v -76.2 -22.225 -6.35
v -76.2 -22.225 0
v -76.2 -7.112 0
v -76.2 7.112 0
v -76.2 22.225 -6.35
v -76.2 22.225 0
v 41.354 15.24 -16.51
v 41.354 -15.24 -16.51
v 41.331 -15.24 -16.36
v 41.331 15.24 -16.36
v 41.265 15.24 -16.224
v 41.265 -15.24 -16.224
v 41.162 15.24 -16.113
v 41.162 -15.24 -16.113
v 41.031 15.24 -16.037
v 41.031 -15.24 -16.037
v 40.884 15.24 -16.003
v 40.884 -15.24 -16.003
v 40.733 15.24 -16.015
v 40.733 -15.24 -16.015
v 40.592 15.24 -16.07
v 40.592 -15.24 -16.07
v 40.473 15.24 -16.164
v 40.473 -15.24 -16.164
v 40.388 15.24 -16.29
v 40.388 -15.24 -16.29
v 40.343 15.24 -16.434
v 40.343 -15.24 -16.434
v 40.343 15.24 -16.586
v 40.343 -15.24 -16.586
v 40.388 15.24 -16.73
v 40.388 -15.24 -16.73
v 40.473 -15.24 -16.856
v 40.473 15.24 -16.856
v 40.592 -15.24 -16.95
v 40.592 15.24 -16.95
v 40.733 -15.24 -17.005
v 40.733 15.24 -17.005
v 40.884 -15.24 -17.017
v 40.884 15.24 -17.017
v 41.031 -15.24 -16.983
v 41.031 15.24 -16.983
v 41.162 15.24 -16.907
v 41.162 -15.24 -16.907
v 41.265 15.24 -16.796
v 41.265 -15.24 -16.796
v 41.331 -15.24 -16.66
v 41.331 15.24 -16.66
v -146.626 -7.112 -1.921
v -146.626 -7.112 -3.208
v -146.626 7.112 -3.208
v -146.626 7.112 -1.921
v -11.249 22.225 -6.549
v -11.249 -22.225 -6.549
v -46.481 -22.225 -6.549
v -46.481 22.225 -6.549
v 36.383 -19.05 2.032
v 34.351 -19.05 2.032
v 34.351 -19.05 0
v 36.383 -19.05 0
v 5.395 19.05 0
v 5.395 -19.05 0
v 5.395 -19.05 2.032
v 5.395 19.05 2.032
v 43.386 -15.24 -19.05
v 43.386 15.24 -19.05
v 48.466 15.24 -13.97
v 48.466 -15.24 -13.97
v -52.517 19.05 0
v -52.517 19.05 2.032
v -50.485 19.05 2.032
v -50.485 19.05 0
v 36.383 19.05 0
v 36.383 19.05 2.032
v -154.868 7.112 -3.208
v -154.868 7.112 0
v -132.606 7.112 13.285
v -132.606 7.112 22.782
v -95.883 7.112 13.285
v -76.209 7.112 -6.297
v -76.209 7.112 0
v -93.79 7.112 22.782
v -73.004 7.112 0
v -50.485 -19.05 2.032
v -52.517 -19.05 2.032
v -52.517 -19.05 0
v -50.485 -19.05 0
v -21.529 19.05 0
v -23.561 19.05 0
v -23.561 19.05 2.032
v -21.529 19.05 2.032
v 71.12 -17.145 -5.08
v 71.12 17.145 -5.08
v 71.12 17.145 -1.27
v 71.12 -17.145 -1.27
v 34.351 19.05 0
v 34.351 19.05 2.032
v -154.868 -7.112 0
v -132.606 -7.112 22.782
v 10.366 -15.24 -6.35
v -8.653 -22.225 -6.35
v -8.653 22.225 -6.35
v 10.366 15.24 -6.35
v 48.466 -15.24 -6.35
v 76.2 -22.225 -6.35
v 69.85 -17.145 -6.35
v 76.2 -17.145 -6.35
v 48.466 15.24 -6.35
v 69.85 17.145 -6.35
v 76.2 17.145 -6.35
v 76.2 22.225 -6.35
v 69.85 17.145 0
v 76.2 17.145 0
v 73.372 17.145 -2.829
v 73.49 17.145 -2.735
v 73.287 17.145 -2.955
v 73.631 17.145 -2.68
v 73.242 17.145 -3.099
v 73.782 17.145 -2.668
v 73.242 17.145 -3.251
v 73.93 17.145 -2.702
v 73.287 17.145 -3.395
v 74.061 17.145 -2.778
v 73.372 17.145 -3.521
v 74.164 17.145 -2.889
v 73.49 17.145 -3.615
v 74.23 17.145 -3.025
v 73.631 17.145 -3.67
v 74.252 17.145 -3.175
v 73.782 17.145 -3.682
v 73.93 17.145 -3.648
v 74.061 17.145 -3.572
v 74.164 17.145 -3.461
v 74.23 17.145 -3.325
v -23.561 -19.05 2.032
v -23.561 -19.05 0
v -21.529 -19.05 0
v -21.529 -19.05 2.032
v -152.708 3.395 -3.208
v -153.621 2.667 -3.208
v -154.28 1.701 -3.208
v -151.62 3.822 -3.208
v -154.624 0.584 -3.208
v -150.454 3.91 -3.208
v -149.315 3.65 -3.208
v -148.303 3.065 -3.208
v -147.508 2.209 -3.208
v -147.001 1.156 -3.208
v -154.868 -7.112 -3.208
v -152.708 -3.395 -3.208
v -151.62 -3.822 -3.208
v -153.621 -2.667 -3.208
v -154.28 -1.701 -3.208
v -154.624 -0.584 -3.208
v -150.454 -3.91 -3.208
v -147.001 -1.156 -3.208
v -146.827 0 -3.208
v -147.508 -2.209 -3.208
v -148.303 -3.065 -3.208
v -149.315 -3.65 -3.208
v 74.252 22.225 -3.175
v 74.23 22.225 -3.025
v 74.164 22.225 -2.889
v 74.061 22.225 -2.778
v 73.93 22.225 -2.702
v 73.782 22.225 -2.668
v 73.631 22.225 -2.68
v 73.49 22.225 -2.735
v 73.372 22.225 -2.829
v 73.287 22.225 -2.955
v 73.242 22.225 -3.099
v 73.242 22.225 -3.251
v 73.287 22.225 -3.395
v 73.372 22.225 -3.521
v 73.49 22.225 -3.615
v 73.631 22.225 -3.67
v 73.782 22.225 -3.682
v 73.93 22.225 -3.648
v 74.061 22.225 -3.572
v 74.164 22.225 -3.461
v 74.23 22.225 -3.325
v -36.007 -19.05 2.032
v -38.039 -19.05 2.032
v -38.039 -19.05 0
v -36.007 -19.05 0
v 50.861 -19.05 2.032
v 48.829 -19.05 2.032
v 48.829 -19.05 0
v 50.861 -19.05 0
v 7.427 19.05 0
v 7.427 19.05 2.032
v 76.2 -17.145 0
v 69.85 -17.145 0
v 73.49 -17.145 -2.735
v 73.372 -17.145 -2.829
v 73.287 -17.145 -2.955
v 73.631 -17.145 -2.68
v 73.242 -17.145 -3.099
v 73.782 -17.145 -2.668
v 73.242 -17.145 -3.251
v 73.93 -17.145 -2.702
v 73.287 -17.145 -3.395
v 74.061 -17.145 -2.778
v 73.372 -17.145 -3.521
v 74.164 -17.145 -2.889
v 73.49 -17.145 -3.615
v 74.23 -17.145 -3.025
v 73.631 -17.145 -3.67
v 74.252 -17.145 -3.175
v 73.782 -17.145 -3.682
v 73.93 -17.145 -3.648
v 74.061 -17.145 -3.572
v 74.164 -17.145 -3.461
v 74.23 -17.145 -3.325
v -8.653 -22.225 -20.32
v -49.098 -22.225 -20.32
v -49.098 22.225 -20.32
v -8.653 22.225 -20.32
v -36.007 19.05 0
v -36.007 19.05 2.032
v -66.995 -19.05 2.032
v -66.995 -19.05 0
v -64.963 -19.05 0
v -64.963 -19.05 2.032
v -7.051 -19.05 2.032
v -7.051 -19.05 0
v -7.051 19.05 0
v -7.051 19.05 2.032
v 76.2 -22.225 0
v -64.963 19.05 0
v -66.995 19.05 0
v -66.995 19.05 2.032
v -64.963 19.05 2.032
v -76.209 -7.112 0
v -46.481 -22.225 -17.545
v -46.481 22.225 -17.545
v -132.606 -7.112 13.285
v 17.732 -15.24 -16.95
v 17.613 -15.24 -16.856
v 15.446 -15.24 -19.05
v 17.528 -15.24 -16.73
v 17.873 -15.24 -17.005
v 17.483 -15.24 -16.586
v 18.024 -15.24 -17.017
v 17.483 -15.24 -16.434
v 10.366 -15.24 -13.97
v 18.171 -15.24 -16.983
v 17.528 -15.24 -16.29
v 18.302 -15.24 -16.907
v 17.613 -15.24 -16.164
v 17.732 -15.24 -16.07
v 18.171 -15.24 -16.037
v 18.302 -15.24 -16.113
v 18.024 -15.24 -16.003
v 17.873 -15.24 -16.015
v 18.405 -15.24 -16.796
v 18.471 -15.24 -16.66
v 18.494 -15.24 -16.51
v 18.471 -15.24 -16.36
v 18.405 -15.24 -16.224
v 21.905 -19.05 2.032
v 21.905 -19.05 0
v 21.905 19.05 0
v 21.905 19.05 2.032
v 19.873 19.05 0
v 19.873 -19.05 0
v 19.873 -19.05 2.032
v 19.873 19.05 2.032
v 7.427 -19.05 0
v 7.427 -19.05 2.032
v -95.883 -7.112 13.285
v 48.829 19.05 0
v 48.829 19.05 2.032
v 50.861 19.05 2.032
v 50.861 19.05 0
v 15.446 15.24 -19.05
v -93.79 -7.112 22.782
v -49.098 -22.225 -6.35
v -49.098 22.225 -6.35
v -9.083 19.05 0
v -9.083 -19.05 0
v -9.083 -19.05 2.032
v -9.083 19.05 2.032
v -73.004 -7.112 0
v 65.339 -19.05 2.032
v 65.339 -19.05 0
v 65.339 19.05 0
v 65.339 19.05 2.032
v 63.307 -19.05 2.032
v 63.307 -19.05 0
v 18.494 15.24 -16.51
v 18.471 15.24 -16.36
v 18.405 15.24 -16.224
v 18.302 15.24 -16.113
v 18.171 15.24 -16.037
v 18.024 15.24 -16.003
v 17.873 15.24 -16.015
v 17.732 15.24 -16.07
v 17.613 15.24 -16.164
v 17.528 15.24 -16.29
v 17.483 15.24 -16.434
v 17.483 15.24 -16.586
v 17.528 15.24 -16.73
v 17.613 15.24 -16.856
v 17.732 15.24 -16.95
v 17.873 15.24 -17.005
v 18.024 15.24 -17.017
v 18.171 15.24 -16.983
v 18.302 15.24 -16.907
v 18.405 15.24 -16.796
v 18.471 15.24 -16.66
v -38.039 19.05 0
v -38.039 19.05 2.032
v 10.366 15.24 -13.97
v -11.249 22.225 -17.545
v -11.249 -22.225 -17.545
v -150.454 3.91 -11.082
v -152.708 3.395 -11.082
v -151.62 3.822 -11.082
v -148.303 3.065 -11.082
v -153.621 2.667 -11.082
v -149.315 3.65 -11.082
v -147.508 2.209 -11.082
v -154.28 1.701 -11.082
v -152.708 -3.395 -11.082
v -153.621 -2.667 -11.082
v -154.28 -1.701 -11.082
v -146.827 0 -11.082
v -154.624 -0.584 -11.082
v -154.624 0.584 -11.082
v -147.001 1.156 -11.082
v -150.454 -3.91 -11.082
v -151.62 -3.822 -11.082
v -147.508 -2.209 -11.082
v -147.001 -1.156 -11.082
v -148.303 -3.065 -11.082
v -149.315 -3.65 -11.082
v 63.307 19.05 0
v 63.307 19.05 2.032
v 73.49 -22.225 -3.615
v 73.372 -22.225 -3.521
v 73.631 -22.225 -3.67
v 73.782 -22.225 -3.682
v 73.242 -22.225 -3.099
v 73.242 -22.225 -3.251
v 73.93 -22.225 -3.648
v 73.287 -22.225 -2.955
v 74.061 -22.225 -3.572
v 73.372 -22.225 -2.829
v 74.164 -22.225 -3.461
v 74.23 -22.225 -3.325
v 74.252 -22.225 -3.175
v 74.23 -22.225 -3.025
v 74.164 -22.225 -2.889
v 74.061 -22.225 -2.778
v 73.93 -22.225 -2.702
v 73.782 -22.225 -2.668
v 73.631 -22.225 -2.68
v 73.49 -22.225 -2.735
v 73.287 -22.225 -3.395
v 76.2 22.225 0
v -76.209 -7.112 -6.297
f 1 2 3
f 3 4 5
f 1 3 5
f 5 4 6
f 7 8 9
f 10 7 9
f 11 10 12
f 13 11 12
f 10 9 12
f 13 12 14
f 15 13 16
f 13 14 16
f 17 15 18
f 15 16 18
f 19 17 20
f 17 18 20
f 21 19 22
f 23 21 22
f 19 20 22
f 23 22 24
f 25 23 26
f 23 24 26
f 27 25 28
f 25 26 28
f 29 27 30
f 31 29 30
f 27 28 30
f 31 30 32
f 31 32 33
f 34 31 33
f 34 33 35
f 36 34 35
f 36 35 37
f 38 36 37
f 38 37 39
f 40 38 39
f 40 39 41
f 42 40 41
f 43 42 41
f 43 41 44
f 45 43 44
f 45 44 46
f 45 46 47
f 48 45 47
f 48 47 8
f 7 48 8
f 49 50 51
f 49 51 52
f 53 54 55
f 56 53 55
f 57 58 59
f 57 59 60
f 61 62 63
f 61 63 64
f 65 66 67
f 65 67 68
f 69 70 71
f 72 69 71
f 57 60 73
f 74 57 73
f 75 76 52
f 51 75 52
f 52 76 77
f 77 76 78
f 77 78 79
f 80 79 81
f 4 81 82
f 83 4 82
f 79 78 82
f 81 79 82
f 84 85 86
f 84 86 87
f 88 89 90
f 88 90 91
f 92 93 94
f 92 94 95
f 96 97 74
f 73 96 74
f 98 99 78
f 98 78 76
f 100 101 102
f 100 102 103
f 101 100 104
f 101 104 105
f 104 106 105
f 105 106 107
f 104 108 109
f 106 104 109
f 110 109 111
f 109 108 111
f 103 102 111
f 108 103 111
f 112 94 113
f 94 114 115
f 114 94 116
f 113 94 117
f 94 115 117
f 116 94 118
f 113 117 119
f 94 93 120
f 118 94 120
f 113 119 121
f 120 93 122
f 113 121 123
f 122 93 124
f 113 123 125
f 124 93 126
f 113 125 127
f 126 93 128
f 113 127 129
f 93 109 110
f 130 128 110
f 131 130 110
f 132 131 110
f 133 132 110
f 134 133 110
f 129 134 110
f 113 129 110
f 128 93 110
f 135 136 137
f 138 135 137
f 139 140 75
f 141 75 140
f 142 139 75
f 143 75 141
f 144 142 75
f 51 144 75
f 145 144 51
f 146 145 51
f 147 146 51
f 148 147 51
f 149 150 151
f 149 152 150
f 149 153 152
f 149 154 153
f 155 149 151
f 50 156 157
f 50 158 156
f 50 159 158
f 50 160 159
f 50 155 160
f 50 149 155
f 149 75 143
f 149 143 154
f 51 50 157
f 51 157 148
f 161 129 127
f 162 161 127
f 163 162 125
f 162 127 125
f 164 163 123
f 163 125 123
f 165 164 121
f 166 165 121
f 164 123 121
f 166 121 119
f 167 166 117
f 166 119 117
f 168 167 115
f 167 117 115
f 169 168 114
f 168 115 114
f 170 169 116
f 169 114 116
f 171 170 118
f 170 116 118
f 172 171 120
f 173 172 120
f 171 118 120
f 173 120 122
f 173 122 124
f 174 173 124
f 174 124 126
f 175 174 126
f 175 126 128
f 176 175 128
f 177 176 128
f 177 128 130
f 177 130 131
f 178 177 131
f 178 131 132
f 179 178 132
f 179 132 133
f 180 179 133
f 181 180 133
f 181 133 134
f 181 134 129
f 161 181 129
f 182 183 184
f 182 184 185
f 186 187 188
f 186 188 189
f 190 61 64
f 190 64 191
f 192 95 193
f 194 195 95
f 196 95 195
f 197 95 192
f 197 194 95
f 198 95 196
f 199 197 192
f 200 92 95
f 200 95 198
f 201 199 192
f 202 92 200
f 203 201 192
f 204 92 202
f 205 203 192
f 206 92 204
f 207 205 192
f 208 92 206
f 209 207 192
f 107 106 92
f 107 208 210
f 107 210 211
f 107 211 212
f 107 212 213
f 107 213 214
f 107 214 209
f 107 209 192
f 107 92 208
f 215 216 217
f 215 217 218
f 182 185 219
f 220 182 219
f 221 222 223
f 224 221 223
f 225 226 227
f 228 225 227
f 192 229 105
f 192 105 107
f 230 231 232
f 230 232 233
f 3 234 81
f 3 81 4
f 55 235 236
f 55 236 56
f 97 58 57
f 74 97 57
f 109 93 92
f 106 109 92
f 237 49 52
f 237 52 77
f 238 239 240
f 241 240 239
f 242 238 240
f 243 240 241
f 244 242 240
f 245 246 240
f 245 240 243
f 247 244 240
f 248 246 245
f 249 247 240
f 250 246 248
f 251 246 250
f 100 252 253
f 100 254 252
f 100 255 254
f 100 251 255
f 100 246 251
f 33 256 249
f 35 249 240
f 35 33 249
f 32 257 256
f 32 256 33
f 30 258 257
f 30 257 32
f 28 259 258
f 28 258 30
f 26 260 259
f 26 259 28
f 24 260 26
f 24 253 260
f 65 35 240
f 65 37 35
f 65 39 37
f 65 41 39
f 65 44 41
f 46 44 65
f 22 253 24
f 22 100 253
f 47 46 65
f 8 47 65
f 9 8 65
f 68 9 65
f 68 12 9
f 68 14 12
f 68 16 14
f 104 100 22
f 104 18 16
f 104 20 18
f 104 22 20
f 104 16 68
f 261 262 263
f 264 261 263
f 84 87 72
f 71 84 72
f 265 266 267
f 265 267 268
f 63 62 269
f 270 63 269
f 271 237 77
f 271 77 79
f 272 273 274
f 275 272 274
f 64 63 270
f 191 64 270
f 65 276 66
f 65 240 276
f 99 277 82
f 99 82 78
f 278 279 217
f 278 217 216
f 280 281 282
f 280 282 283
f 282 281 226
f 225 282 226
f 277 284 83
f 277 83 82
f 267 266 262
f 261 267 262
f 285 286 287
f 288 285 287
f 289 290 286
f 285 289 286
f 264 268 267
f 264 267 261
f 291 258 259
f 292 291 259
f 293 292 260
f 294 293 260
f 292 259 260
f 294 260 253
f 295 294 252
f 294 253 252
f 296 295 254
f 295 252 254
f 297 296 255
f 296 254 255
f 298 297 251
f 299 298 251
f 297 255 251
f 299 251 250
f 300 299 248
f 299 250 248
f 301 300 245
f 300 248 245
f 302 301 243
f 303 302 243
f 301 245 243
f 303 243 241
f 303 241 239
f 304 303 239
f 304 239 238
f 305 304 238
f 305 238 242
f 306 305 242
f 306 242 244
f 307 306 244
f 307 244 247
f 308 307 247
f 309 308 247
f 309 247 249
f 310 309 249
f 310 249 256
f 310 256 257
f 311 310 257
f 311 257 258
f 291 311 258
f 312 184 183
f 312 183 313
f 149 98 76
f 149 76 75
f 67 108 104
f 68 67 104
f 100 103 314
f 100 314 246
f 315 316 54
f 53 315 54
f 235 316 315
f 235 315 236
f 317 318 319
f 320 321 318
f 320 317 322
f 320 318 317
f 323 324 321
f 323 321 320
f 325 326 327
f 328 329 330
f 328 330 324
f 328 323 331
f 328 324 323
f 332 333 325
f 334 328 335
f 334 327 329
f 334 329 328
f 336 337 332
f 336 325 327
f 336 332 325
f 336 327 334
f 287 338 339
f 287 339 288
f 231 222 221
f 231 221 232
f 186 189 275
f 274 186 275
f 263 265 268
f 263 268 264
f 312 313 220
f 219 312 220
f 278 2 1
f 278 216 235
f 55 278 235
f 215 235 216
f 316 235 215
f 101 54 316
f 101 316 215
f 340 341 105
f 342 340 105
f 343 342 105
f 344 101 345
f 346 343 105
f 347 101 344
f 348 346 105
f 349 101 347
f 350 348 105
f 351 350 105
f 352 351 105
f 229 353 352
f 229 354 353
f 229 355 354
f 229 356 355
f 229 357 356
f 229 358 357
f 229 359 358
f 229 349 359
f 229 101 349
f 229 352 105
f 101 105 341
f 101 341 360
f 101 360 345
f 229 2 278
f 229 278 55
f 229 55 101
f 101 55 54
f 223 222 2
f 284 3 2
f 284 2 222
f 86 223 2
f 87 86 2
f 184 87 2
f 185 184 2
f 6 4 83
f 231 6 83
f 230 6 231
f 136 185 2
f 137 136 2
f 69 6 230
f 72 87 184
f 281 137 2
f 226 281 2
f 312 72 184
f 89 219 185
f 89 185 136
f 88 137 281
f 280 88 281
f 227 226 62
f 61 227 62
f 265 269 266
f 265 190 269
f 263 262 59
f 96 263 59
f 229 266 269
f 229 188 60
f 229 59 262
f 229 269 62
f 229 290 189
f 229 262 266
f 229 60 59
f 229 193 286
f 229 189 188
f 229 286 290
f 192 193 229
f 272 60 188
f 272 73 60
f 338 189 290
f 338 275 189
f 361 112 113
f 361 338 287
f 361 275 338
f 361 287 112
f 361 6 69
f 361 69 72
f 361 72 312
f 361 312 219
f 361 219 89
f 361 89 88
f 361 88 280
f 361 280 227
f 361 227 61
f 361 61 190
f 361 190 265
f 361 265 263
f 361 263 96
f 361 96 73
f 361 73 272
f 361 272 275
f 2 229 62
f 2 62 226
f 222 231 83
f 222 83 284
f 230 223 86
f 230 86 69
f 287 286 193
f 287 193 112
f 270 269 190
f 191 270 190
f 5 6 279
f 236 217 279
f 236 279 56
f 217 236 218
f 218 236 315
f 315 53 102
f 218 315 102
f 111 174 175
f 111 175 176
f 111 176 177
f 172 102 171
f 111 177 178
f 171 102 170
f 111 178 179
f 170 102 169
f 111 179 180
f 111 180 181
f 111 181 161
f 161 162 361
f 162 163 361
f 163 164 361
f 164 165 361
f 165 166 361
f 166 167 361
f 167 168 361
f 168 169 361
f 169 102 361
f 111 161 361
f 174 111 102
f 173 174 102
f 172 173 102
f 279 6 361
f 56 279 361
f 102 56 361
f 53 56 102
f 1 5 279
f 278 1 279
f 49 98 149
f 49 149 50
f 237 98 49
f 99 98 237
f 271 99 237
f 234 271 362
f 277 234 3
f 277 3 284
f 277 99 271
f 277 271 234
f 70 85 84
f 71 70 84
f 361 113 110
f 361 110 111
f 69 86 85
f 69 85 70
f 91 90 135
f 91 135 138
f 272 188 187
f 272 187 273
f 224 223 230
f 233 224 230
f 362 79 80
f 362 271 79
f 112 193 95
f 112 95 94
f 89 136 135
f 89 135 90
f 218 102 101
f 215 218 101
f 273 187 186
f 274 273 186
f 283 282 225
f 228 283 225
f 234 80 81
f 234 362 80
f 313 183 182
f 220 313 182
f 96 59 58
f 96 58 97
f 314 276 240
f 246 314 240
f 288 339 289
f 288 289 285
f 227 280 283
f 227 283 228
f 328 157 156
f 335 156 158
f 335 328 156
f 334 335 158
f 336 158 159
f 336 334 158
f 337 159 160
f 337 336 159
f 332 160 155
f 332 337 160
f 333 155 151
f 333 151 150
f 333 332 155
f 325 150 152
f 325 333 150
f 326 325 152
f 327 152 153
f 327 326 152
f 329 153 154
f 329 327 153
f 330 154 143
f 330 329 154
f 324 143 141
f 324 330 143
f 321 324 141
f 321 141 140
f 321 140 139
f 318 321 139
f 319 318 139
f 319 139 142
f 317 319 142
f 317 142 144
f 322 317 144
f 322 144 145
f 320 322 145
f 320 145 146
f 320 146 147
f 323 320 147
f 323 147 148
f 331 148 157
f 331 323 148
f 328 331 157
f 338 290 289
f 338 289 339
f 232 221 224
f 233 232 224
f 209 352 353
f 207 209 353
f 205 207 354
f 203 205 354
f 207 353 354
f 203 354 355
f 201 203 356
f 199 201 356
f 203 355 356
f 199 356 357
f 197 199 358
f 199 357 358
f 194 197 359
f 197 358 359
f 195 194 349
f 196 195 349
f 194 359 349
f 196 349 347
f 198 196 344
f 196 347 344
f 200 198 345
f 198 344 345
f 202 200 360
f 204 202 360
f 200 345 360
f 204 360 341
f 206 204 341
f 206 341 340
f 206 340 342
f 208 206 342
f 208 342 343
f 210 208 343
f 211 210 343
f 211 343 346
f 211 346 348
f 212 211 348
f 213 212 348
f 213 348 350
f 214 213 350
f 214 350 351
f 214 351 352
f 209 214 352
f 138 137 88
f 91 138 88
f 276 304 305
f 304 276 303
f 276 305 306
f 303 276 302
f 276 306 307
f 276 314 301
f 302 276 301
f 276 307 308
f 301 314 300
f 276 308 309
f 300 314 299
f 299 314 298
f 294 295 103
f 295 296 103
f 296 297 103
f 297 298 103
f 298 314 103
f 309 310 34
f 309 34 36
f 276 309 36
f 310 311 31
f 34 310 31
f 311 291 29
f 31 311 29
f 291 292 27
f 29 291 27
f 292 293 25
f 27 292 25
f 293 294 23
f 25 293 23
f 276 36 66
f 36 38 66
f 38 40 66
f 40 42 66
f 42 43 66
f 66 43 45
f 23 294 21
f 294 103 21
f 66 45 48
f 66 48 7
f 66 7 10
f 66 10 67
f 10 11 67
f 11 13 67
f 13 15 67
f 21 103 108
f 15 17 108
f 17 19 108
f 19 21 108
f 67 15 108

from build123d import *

# Parameters (mm, degrees)
F0_W      = 152.4
F0_H      = 44.45
F1_DEPTH  = 6.35
F2_W      = 38.1
F2_H      = 30.48
F3_DEPTH  = 12.7
F2_W_2    = 5.08
F2_H_2    = 34.29
F4_DEPTH  = 25.4
F5_R      = 0.508
F6_DEPTH  = 49.2252
F7_SIZE   = 5.08
F8_SIZE   = 1.27
F10_DEPTH = 7.112
F11_W     = 8.2420259714
F11_H     = 14.224
F11_R     = 3.9205193465
F12_DEPTH = 7.874
F13_W     = 2.032
F13_H     = 38.1
F14_DEPTH = 2.032
F15_R     = 0.508
F16_DEPTH = 33.274
F17_W     = 40.4452867806
F17_H     = 44.45
F18_DEPTH = 13.97
F19_W     = 35.2318603545
F19_H     = 10.9959305264
F20_DEPTH = 53.086


with BuildPart() as f1:
    # F0 (on Top) → F1 (new body)
    with BuildSketch(Plane.XY):
        Rectangle(F0_W, F0_H)
    extrude(amount=-F1_DEPTH)

    # F2 (on face) → F3 (join)
    with BuildSketch(Plane(origin=(0, 0, -6.35), x_dir=(1, 0, 0), z_dir=(0, 0, -1))):
        with Locations((29.4156006661, 0)):
            Rectangle(F2_W, F2_H)
    extrude(amount=F3_DEPTH)

    # F2 (on face) → F4 (cut)
    with BuildSketch(Plane(origin=(0, 0, -6.35), x_dir=(1, 0, 0), z_dir=(0, 0, -1))):
        with Locations((73.66, 0)):
            Rectangle(F2_W_2, F2_H_2)
    extrude(amount=-F4_DEPTH, mode=Mode.SUBTRACT)

    # F5 (on face) → F6 (cut)
    with BuildSketch(Plane.XZ.offset(22.225)):
        with Locations((73.7442225218, -3.175)):
            Circle(F5_R)
    extrude(amount=-F6_DEPTH, mode=Mode.SUBTRACT)

    # F7
    f7_edges = [f1.edges().sort_by_distance(p)[0] for p in [
        (10.365601, 0, -19.05),
        (48.465601, 0, -19.05),
    ]]
    chamfer(f7_edges, length=F7_SIZE)

    # F8
    f8_edges = [f1.edges().sort_by_distance(p)[0] for p in [
        (71.12, 0, 0),
        (71.12, 0, -6.35),
    ]]
    chamfer(f8_edges, length=F8_SIZE)

    # F9 (on Front) → F10 (join, symmetric)
    with BuildSketch(Plane.XZ):
        Polygon((-76.2085393071, 0), (-73.0043798685, 0), (-93.789872226, 22.7824151516), (-132.6064432787, 22.7824151516), (-154.8683792353, 0), (-154.8683792353, -11.0822748393), (-146.6263532639, -11.0822748393), (-146.6263532639, -1.9209668972), (-132.6064432787, 13.28467889), (-95.8832409805, 13.28467889), (-76.2085393071, -6.2972982414), align=None)
    extrude(amount=F10_DEPTH, both=True)

    # F11 (on face) → F12 (cut)
    with BuildSketch(Plane(origin=(0, 0, -11.0822748393), x_dir=(1, 0, 0), z_dir=(0, 0, -1))):
        with Locations((-150.7473662496, 0)):
            Rectangle(F11_W, F11_H)
        with Locations((-150.7473662496, 0)):
            Circle(F11_R, mode=Mode.SUBTRACT)
    extrude(amount=-F12_DEPTH, mode=Mode.SUBTRACT)

    # F13 (on face) → F14 (join)
    with BuildSketch(Plane.XY):
        with Locations((-65.9789626062, 0)):
            Rectangle(F13_W, F13_H)
        with Locations((-51.5009626062, 0)):
            Rectangle(F13_W, F13_H)
        with Locations((-37.0229626062, 0)):
            Rectangle(F13_W, F13_H)
        with Locations((-22.5449626062, 0)):
            Rectangle(F13_W, F13_H)
        with Locations((-8.0669626062, 0)):
            Rectangle(F13_W, F13_H)
        with Locations((6.4110373938, 0)):
            Rectangle(F13_W, F13_H)
        with Locations((20.8890373938, 0)):
            Rectangle(F13_W, F13_H)
        with Locations((35.3670373938, 0)):
            Rectangle(F13_W, F13_H)
        with Locations((49.8450373938, 0)):
            Rectangle(F13_W, F13_H)
        with Locations((64.3230373938, 0)):
            Rectangle(F13_W, F13_H)
    extrude(amount=F14_DEPTH)

    # F15 (on face) → F16 (cut)
    with BuildSketch(Plane.XZ.offset(15.24)):
        with Locations((17.9856006661, -16.51)):
            Circle(F15_R)
        with Locations((40.8456006661, -16.51)):
            Circle(F15_R)
    extrude(amount=-F16_DEPTH, mode=Mode.SUBTRACT)

    # F17 (on face) → F18 (join)
    with BuildSketch(Plane(origin=(0, 0, -6.35), x_dir=(1, 0, 0), z_dir=(0, 0, -1))):
        with Locations((-28.8755632937, 0)):
            Rectangle(F17_W, F17_H)
    extrude(amount=F18_DEPTH)

    # F19 (on face) → F20 (cut)
    with BuildSketch(Plane(origin=(0, 22.225, 0), x_dir=(-1, 0, 0), z_dir=(0, 1, 0))):
        with Locations((28.8652880117, -12.0470381808)):
            Rectangle(F19_W, F19_H)
    extrude(amount=-F20_DEPTH, mode=Mode.SUBTRACT)


solid = f1.part
